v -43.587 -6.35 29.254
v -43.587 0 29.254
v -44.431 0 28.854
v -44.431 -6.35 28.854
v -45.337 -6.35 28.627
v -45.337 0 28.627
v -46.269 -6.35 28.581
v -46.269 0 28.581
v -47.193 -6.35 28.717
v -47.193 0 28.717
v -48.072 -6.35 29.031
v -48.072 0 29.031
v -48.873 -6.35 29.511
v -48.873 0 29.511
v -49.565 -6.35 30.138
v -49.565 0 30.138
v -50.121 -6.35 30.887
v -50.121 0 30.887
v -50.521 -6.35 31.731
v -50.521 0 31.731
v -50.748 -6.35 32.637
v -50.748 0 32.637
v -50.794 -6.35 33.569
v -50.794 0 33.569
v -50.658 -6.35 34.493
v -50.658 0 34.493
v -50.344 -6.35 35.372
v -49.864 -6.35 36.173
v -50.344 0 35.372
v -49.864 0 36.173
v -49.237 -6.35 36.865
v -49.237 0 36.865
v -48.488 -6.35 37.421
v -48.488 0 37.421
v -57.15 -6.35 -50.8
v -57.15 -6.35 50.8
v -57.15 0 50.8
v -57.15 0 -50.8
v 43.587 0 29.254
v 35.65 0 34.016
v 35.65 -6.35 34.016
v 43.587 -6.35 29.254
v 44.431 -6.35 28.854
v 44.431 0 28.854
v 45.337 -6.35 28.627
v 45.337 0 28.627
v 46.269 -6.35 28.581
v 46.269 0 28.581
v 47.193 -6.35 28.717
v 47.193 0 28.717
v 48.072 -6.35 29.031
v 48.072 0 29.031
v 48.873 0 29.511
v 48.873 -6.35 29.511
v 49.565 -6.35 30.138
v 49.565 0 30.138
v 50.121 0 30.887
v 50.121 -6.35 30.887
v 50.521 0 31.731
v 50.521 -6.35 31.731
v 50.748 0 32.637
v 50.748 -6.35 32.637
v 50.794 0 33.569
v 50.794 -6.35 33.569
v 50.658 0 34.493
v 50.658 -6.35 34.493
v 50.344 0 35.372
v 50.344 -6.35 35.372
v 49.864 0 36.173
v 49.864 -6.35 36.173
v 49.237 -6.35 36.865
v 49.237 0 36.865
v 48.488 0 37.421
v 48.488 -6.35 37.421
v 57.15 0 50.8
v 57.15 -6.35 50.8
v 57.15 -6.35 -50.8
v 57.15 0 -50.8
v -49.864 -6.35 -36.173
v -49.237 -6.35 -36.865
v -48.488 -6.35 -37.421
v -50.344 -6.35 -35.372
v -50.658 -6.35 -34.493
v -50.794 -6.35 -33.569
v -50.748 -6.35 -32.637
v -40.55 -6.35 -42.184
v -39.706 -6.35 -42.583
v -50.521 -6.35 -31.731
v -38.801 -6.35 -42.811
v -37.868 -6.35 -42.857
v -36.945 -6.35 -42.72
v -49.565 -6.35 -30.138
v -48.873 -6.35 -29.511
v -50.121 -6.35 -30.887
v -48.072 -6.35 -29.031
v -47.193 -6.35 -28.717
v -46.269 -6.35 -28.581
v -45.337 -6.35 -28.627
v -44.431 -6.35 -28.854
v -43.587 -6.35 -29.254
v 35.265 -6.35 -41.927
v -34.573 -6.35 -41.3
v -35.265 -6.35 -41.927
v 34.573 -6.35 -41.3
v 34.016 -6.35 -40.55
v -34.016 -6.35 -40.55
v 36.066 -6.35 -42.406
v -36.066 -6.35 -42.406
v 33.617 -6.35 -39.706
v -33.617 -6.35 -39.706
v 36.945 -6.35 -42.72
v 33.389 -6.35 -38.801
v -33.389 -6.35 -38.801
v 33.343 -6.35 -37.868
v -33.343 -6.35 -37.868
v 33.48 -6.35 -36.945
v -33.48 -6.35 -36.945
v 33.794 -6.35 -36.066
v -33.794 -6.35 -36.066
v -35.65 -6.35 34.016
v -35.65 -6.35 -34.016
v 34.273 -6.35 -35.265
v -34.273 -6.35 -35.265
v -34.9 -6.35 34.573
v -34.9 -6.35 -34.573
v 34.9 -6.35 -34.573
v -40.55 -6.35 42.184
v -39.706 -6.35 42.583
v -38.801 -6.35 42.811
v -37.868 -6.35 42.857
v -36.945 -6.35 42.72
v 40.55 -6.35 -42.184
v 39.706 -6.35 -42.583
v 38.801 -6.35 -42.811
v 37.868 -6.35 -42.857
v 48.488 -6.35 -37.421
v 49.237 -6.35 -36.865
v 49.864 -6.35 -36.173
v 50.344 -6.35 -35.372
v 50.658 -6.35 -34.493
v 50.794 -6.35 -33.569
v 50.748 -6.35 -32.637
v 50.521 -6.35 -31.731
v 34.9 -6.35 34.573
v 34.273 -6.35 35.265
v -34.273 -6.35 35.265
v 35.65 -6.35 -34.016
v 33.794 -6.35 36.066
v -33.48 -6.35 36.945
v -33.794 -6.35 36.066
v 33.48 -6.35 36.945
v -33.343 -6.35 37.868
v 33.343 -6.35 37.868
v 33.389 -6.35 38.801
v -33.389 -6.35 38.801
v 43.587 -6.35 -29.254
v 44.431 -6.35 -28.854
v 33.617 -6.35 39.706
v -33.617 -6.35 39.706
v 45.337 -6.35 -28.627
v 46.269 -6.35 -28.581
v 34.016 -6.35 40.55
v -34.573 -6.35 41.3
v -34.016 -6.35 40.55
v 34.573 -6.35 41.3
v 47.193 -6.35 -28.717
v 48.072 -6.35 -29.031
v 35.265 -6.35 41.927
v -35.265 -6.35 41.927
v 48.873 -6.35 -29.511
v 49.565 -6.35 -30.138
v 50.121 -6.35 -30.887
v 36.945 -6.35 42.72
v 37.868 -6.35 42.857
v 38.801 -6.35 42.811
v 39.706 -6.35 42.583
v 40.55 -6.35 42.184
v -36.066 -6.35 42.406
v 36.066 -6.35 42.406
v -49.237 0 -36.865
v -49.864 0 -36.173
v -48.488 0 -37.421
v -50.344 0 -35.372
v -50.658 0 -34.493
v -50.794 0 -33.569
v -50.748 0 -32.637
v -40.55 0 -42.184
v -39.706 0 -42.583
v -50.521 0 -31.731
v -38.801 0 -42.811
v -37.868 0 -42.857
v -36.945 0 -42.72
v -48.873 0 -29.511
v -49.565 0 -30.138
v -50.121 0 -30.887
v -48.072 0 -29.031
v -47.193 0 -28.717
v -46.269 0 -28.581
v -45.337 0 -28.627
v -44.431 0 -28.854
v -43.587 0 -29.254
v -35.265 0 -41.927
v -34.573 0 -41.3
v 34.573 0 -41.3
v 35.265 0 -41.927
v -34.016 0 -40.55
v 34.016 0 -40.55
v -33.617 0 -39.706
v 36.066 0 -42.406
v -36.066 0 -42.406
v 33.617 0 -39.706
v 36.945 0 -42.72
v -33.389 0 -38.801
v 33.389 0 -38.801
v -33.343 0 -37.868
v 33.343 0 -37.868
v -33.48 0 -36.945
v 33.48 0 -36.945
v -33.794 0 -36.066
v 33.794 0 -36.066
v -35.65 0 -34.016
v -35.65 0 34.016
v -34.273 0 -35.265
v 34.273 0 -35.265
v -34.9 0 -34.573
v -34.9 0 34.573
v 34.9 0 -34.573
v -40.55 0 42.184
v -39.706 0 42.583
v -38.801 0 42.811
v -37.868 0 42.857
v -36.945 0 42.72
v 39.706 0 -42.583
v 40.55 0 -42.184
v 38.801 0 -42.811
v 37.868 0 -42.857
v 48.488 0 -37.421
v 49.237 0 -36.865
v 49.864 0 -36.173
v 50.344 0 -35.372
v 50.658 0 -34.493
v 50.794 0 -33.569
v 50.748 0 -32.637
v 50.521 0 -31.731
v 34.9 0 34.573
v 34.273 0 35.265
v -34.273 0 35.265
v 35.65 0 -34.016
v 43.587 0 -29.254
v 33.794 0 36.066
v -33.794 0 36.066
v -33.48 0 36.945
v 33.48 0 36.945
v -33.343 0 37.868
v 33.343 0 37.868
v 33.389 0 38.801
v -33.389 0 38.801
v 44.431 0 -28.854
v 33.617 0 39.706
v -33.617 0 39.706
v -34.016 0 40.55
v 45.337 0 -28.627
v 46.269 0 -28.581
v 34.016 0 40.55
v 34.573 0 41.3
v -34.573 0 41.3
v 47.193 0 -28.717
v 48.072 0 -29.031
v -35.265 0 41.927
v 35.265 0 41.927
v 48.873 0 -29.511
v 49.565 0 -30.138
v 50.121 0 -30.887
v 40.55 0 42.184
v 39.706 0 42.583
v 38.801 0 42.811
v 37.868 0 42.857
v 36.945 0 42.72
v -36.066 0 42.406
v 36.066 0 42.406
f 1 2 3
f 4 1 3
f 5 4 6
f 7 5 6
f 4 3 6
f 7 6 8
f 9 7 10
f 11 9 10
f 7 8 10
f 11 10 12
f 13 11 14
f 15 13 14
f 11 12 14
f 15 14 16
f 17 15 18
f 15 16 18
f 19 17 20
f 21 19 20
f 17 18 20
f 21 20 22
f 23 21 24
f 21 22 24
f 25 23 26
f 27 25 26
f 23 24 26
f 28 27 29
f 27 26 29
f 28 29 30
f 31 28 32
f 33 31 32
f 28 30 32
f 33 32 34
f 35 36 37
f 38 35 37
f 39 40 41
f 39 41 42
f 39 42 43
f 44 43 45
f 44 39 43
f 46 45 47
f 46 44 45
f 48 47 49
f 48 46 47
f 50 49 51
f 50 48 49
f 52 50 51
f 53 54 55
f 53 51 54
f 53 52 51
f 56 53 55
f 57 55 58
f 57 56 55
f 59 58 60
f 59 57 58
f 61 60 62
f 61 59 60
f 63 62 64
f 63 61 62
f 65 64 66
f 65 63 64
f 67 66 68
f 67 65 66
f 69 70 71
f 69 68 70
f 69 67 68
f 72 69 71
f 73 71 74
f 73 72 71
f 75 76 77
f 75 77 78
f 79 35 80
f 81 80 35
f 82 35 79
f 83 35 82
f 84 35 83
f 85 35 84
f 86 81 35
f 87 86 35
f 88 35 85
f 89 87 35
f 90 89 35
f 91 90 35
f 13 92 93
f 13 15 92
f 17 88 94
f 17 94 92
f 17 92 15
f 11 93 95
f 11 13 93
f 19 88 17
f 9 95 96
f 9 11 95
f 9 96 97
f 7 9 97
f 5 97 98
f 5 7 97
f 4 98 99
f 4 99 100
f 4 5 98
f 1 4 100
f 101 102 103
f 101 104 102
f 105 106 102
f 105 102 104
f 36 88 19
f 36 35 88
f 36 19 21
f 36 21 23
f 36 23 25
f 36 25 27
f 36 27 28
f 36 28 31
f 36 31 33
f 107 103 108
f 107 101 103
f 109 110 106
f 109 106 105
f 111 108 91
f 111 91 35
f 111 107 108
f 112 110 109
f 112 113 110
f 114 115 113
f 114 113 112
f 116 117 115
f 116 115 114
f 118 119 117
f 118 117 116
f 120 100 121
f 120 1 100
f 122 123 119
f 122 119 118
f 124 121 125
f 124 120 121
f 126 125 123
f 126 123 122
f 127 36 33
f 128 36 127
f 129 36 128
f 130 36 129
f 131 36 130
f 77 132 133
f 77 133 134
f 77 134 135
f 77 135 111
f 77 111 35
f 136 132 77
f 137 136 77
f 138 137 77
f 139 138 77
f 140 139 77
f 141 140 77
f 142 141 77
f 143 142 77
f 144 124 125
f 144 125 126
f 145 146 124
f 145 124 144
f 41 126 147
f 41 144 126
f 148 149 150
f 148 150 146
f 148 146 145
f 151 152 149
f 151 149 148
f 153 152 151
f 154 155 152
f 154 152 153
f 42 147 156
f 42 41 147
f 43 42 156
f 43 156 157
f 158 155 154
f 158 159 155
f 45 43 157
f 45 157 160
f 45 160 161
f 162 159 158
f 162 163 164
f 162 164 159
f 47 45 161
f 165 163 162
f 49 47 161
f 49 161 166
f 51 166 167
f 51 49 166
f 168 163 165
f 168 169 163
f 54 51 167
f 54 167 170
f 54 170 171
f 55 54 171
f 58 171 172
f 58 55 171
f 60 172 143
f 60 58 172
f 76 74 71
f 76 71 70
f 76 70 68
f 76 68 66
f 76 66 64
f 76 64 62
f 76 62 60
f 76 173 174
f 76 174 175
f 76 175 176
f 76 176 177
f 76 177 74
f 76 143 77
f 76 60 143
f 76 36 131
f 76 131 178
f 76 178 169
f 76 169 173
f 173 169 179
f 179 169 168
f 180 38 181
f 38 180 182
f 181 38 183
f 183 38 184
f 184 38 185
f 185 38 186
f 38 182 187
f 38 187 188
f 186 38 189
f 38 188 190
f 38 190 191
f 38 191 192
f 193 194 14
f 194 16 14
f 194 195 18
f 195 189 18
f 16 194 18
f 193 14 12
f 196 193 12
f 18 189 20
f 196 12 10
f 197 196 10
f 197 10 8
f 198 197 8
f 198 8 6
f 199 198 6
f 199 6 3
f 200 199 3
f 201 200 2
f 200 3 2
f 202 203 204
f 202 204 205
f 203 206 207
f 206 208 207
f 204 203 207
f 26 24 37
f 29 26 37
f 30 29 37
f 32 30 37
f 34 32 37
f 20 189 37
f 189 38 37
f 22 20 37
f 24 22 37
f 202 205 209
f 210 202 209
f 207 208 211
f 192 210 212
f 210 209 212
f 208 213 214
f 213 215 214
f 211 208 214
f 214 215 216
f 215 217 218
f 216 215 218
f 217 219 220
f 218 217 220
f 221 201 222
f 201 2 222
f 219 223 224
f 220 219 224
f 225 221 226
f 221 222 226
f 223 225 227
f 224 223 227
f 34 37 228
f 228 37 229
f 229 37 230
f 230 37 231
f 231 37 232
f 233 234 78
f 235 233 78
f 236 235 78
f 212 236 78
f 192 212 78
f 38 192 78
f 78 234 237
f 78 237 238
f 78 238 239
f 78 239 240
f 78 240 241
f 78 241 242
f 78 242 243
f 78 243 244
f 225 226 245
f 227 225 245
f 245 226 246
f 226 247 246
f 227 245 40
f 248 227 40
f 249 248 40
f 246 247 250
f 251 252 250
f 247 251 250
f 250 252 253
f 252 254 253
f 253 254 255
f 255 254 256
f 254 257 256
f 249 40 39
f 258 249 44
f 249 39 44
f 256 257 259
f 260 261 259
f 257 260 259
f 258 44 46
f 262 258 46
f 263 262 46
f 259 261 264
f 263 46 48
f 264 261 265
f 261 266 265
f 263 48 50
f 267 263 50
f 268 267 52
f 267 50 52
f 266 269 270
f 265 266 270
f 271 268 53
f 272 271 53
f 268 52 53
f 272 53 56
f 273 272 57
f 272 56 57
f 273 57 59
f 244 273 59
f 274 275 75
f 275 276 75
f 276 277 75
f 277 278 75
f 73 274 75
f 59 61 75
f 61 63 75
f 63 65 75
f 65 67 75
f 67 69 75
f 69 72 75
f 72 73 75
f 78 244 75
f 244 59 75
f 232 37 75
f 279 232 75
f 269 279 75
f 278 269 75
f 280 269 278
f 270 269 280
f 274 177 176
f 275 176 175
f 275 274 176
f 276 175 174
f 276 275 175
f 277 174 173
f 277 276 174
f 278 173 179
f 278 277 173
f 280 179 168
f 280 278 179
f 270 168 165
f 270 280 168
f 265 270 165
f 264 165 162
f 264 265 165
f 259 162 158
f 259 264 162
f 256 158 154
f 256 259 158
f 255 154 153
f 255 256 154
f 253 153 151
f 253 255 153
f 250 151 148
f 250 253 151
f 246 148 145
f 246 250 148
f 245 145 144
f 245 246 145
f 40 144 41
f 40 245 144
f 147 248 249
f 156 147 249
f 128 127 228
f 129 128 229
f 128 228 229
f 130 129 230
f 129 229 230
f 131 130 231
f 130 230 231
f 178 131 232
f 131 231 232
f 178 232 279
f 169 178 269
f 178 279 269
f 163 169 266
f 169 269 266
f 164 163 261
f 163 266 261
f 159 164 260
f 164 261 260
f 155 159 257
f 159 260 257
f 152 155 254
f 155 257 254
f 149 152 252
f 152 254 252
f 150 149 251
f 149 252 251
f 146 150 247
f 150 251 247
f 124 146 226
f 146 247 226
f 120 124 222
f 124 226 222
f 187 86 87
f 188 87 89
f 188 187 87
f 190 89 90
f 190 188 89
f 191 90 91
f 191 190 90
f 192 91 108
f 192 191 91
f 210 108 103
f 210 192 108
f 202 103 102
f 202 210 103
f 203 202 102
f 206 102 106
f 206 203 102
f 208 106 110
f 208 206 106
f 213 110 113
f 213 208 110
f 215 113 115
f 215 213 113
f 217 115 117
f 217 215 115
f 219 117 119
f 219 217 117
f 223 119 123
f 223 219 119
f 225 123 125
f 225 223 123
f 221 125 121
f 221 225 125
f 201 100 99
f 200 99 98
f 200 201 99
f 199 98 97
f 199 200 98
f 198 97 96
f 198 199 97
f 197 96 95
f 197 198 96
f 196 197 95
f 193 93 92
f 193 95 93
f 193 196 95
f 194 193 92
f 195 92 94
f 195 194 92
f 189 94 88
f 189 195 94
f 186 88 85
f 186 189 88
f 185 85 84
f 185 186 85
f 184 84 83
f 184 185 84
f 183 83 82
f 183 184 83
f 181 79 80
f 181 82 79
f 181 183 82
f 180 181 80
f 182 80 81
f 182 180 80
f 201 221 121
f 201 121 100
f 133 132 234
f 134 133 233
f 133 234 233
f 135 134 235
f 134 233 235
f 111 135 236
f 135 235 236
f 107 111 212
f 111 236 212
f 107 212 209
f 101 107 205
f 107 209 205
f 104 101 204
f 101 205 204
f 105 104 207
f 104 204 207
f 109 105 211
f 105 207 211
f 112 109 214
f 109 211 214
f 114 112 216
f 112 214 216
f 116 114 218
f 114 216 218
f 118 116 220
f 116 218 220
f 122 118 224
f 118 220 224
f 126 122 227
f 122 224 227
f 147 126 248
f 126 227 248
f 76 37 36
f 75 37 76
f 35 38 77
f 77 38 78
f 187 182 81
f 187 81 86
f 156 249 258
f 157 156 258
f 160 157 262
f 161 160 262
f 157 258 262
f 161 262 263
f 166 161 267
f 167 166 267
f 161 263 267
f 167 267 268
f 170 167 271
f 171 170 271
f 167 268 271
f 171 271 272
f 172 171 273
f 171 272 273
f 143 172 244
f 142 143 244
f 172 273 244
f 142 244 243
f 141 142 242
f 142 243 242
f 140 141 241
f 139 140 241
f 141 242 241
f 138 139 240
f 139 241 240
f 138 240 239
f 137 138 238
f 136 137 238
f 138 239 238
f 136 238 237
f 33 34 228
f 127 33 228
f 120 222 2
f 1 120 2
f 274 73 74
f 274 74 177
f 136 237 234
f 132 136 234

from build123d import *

# Parameters (mm, degrees)
SKETCH1_W           = 114.3
SKETCH1_H           = 6.35
BOSS_EXTRUDE1_DEPTH = 50.8
F_1_2_HOLES_DEPTH   = 7.35


with BuildPart() as part:
    # Sketch1 → Boss-Extrude1 (new body, symmetric)
    with BuildSketch(Plane.XY):
        with Locations((0, -3.175)):
            Rectangle(SKETCH1_W, SKETCH1_H)
    extrude(amount=BOSS_EXTRUDE1_DEPTH, both=True)

    # Sketch2 → 1-2 holes (cut, through all)
    with BuildSketch(Plane(origin=(0, 0, 0), x_dir=(1, 0, 0), z_dir=(0, 1, 0))):
        with BuildLine():
            Line((-35.649713965, 34.016189941), (-43.587213965, 29.253689941))
            ThreePointArc((-43.587213965, 29.253689941), (-50.121310059, 30.887213965), (-48.487786035, 37.421310059))
            Line((-48.487786035, 37.421310059), (-40.550286035, 42.183810059))
            ThreePointArc((-40.550286035, 42.183810059), (-34.016189941, 40.550286035), (-35.649713965, 34.016189941))
        make_face()
        with BuildLine():
            Line((-35.649713965, -34.016189941), (-43.587213965, -29.253689941))
            ThreePointArc((-43.587213965, -29.253689941), (-50.121310059, -30.887213965), (-48.487786035, -37.421310059))
            Line((-48.487786035, -37.421310059), (-40.550286035, -42.183810059))
            ThreePointArc((-40.550286035, -42.183810059), (-34.016189941, -40.550286035), (-35.649713965, -34.016189941))
        make_face()
        with BuildLine():
            Line((35.649713965, 34.016189941), (43.587213965, 29.253689941))
            ThreePointArc((43.587213965, 29.253689941), (50.121310059, 30.887213965), (48.487786035, 37.421310059))
            Line((48.487786035, 37.421310059), (40.550286035, 42.183810059))
            ThreePointArc((40.550286035, 42.183810059), (34.016189941, 40.550286035), (35.649713965, 34.016189941))
        make_face()
        with BuildLine():
            Line((35.649713965, -34.016189941), (43.587213965, -29.253689941))
            ThreePointArc((43.587213965, -29.253689941), (50.121310059, -30.887213965), (48.487786035, -37.421310059))
            Line((48.487786035, -37.421310059), (40.550286035, -42.183810059))
            ThreePointArc((40.550286035, -42.183810059), (34.016189941, -40.550286035), (35.649713965, -34.016189941))
        make_face()
    extrude(amount=-F_1_2_HOLES_DEPTH, mode=Mode.SUBTRACT)


solid = part.part
